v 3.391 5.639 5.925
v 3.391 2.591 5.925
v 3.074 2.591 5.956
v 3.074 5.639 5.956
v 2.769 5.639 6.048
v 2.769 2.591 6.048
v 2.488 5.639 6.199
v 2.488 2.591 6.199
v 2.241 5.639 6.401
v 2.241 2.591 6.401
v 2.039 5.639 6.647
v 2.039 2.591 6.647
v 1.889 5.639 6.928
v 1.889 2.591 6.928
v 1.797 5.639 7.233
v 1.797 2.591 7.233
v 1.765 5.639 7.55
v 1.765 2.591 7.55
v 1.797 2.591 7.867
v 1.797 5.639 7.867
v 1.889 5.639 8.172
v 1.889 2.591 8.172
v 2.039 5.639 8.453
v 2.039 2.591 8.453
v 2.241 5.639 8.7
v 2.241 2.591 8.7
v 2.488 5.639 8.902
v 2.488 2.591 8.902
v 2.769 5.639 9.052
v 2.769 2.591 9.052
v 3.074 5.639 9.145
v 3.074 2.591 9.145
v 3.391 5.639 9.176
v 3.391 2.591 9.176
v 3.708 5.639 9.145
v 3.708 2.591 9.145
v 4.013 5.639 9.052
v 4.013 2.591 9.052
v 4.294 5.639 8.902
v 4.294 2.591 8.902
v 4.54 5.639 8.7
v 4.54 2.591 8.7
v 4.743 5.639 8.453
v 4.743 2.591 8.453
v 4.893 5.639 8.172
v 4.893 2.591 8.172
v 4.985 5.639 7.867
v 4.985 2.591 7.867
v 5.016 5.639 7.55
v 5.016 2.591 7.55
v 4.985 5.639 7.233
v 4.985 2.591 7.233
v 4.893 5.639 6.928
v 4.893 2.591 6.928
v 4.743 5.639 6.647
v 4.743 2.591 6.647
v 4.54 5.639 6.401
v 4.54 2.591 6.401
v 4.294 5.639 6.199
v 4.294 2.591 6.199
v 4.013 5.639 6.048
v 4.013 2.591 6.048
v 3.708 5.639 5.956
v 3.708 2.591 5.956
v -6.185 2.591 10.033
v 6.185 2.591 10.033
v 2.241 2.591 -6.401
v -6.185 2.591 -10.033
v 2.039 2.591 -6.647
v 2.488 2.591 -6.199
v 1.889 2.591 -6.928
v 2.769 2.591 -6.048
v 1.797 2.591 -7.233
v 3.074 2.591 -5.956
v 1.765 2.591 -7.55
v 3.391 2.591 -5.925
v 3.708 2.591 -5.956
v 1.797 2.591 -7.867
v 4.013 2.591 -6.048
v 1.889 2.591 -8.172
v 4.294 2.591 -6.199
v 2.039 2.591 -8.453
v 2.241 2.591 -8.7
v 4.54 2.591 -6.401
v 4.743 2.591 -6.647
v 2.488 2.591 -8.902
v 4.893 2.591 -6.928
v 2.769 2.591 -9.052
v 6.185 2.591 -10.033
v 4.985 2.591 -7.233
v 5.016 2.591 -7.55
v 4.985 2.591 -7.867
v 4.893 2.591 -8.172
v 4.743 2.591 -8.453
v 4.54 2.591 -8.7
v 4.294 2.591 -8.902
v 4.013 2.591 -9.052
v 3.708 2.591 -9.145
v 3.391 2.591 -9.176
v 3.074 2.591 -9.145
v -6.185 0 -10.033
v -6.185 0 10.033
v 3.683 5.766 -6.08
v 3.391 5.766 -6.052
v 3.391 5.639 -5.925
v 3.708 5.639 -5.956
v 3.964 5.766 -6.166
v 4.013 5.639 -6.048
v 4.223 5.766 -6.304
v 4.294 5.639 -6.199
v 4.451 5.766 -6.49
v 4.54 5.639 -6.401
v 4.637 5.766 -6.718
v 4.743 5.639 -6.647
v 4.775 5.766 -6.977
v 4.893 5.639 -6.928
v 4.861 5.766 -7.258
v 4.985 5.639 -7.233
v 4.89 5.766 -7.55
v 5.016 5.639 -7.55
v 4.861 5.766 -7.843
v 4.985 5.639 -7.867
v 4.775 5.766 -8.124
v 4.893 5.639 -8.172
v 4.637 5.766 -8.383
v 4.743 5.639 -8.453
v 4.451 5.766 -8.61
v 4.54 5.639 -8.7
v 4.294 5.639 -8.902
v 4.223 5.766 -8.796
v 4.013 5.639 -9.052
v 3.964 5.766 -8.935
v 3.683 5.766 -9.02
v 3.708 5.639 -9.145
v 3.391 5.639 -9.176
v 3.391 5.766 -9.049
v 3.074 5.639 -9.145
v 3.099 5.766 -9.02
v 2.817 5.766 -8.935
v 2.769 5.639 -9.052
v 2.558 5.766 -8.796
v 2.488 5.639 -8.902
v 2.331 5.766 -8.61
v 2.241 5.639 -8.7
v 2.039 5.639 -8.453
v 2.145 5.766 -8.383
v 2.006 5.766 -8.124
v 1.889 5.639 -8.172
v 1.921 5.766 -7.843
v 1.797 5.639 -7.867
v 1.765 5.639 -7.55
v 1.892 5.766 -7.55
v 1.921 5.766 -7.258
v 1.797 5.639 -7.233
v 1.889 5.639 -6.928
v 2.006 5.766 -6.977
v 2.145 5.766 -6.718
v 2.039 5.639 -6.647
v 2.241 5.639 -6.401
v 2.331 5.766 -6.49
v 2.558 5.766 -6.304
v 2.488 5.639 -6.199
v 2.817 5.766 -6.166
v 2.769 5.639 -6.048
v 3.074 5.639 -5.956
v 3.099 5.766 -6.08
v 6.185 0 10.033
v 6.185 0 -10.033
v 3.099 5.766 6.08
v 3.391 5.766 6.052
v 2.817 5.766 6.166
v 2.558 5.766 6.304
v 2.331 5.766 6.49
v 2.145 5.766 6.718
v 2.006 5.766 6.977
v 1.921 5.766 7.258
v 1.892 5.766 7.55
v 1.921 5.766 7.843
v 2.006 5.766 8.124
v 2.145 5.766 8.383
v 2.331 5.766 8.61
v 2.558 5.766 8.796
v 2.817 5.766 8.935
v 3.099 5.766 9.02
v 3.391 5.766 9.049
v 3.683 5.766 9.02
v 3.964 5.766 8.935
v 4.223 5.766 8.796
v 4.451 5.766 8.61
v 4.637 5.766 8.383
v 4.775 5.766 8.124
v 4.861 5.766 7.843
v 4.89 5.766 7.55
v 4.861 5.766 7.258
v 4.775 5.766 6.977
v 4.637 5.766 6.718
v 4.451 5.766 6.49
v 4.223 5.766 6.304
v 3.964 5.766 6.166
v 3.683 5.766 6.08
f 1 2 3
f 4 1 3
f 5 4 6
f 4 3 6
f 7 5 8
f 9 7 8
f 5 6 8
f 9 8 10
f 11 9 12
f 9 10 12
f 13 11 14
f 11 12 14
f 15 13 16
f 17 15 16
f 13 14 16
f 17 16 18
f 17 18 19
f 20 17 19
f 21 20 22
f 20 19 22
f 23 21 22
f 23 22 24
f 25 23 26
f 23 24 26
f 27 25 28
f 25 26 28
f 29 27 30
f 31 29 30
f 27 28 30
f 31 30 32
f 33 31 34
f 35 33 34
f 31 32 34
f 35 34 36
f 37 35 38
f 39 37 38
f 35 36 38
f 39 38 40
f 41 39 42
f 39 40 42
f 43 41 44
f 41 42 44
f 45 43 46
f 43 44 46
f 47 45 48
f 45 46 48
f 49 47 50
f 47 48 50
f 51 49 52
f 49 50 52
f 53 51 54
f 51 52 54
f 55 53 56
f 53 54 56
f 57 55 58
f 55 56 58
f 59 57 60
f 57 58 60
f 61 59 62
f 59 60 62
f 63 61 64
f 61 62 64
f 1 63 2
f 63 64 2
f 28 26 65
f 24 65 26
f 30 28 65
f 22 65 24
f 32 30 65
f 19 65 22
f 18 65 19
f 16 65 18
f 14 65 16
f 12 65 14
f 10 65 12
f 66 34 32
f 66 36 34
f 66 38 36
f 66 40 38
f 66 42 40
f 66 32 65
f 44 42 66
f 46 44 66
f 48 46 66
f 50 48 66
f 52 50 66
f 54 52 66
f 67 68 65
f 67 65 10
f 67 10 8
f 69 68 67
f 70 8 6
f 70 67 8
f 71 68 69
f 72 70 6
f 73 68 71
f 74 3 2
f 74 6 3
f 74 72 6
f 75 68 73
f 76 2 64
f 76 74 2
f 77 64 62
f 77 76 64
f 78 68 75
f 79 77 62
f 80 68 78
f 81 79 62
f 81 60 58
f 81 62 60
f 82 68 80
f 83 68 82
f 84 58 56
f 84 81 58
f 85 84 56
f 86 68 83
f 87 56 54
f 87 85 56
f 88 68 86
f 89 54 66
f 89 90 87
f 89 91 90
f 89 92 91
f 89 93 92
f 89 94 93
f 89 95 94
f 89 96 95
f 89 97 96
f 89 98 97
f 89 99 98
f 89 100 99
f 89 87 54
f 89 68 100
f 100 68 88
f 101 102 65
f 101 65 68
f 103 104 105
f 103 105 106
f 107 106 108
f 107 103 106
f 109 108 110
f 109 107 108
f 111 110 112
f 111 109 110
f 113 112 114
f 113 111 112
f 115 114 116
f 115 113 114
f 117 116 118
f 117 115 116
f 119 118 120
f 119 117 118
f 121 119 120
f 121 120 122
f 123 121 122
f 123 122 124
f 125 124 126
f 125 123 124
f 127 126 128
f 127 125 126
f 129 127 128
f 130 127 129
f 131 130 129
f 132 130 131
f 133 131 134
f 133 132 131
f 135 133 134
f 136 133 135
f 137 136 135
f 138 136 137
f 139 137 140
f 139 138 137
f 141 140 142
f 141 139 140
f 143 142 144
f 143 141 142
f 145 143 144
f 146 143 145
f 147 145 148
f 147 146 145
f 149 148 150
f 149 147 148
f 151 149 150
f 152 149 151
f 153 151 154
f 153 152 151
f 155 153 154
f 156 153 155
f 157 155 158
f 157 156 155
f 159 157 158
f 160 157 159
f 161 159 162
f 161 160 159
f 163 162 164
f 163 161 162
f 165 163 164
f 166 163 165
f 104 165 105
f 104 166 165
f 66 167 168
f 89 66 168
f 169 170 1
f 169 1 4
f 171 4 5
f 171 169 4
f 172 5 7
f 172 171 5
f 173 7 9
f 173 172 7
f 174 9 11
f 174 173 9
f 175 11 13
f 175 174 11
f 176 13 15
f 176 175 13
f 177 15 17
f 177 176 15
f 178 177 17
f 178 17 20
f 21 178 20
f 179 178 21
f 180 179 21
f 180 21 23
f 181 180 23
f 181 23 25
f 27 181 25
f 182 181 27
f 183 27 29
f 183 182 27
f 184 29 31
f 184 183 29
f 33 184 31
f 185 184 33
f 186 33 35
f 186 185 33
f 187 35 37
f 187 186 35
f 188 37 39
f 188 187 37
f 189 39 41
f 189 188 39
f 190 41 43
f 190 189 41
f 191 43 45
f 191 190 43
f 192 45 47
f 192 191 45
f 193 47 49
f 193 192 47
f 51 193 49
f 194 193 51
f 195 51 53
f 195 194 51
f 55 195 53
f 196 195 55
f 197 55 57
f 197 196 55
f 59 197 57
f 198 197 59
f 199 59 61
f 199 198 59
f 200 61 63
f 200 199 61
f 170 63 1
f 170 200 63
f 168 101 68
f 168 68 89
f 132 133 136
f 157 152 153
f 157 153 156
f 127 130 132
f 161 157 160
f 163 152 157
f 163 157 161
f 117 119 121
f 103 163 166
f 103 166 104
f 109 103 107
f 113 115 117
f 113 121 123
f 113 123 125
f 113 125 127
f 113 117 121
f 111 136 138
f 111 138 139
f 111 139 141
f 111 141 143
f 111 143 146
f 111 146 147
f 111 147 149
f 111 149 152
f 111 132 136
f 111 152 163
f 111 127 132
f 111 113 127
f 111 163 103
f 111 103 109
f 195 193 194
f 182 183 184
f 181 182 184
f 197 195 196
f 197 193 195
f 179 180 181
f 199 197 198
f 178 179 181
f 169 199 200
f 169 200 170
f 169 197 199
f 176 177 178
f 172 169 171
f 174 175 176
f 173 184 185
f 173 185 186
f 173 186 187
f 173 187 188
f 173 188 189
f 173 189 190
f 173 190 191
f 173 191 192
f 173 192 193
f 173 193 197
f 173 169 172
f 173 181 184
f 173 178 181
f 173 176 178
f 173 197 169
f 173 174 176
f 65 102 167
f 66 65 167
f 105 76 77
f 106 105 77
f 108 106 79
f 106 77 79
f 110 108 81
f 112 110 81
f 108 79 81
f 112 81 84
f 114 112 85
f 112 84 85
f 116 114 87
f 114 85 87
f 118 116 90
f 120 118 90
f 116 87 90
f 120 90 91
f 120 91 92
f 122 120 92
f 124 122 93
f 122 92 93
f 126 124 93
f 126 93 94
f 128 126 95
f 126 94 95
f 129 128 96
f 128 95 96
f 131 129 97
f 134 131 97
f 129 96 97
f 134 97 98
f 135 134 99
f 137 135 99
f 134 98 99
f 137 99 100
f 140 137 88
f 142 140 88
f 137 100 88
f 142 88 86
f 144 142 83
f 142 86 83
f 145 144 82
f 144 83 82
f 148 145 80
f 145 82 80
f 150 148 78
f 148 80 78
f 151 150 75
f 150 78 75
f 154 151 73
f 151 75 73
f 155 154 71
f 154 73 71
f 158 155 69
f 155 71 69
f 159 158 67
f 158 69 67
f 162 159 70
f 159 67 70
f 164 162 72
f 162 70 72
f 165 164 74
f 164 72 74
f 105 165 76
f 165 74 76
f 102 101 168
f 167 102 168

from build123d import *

# Parameters (mm, degrees)
SKETCH1_W           = 12.3698
SKETCH1_H           = 20.066
BOSS_EXTRUDE1_DEPTH = 2.5908
SKETCH2_R           = 1.6256
BOSS_EXTRUDE2_DEPTH = 3.175
CHAMFER1_SIZE       = 0.127


with BuildPart() as part:
    # Sketch1 → Boss-Extrude1 (new body)
    with BuildSketch(Plane(origin=(0, 0, 0), x_dir=(1, 0, 0), z_dir=(0, 1, 0))):
        Rectangle(SKETCH1_W, SKETCH1_H)
    extrude(amount=BOSS_EXTRUDE1_DEPTH)

    # Sketch2 → Boss-Extrude2 (add)
    with BuildSketch(Plane(origin=(0, 2.5908, 0), x_dir=(1, 0, 0), z_dir=(0, 1, 0))):
        with Locations(Location((3.3909, 7.55015, 0), (0, 0, 270))):
            Circle(SKETCH2_R)
        with Locations(Location((3.3909, -7.55015, 0), (0, 0, 90))):
            Circle(SKETCH2_R)
    extrude(amount=BOSS_EXTRUDE2_DEPTH)

    # Chamfer1
    chamfer1_edges = [part.edges().sort_by_distance(p)[0] for p in [
        (3.3909, 5.7658, -9.17575),
        (3.3909, 5.7658, 9.17575),
    ]]
    chamfer(chamfer1_edges, length=CHAMFER1_SIZE)


solid = part.part
